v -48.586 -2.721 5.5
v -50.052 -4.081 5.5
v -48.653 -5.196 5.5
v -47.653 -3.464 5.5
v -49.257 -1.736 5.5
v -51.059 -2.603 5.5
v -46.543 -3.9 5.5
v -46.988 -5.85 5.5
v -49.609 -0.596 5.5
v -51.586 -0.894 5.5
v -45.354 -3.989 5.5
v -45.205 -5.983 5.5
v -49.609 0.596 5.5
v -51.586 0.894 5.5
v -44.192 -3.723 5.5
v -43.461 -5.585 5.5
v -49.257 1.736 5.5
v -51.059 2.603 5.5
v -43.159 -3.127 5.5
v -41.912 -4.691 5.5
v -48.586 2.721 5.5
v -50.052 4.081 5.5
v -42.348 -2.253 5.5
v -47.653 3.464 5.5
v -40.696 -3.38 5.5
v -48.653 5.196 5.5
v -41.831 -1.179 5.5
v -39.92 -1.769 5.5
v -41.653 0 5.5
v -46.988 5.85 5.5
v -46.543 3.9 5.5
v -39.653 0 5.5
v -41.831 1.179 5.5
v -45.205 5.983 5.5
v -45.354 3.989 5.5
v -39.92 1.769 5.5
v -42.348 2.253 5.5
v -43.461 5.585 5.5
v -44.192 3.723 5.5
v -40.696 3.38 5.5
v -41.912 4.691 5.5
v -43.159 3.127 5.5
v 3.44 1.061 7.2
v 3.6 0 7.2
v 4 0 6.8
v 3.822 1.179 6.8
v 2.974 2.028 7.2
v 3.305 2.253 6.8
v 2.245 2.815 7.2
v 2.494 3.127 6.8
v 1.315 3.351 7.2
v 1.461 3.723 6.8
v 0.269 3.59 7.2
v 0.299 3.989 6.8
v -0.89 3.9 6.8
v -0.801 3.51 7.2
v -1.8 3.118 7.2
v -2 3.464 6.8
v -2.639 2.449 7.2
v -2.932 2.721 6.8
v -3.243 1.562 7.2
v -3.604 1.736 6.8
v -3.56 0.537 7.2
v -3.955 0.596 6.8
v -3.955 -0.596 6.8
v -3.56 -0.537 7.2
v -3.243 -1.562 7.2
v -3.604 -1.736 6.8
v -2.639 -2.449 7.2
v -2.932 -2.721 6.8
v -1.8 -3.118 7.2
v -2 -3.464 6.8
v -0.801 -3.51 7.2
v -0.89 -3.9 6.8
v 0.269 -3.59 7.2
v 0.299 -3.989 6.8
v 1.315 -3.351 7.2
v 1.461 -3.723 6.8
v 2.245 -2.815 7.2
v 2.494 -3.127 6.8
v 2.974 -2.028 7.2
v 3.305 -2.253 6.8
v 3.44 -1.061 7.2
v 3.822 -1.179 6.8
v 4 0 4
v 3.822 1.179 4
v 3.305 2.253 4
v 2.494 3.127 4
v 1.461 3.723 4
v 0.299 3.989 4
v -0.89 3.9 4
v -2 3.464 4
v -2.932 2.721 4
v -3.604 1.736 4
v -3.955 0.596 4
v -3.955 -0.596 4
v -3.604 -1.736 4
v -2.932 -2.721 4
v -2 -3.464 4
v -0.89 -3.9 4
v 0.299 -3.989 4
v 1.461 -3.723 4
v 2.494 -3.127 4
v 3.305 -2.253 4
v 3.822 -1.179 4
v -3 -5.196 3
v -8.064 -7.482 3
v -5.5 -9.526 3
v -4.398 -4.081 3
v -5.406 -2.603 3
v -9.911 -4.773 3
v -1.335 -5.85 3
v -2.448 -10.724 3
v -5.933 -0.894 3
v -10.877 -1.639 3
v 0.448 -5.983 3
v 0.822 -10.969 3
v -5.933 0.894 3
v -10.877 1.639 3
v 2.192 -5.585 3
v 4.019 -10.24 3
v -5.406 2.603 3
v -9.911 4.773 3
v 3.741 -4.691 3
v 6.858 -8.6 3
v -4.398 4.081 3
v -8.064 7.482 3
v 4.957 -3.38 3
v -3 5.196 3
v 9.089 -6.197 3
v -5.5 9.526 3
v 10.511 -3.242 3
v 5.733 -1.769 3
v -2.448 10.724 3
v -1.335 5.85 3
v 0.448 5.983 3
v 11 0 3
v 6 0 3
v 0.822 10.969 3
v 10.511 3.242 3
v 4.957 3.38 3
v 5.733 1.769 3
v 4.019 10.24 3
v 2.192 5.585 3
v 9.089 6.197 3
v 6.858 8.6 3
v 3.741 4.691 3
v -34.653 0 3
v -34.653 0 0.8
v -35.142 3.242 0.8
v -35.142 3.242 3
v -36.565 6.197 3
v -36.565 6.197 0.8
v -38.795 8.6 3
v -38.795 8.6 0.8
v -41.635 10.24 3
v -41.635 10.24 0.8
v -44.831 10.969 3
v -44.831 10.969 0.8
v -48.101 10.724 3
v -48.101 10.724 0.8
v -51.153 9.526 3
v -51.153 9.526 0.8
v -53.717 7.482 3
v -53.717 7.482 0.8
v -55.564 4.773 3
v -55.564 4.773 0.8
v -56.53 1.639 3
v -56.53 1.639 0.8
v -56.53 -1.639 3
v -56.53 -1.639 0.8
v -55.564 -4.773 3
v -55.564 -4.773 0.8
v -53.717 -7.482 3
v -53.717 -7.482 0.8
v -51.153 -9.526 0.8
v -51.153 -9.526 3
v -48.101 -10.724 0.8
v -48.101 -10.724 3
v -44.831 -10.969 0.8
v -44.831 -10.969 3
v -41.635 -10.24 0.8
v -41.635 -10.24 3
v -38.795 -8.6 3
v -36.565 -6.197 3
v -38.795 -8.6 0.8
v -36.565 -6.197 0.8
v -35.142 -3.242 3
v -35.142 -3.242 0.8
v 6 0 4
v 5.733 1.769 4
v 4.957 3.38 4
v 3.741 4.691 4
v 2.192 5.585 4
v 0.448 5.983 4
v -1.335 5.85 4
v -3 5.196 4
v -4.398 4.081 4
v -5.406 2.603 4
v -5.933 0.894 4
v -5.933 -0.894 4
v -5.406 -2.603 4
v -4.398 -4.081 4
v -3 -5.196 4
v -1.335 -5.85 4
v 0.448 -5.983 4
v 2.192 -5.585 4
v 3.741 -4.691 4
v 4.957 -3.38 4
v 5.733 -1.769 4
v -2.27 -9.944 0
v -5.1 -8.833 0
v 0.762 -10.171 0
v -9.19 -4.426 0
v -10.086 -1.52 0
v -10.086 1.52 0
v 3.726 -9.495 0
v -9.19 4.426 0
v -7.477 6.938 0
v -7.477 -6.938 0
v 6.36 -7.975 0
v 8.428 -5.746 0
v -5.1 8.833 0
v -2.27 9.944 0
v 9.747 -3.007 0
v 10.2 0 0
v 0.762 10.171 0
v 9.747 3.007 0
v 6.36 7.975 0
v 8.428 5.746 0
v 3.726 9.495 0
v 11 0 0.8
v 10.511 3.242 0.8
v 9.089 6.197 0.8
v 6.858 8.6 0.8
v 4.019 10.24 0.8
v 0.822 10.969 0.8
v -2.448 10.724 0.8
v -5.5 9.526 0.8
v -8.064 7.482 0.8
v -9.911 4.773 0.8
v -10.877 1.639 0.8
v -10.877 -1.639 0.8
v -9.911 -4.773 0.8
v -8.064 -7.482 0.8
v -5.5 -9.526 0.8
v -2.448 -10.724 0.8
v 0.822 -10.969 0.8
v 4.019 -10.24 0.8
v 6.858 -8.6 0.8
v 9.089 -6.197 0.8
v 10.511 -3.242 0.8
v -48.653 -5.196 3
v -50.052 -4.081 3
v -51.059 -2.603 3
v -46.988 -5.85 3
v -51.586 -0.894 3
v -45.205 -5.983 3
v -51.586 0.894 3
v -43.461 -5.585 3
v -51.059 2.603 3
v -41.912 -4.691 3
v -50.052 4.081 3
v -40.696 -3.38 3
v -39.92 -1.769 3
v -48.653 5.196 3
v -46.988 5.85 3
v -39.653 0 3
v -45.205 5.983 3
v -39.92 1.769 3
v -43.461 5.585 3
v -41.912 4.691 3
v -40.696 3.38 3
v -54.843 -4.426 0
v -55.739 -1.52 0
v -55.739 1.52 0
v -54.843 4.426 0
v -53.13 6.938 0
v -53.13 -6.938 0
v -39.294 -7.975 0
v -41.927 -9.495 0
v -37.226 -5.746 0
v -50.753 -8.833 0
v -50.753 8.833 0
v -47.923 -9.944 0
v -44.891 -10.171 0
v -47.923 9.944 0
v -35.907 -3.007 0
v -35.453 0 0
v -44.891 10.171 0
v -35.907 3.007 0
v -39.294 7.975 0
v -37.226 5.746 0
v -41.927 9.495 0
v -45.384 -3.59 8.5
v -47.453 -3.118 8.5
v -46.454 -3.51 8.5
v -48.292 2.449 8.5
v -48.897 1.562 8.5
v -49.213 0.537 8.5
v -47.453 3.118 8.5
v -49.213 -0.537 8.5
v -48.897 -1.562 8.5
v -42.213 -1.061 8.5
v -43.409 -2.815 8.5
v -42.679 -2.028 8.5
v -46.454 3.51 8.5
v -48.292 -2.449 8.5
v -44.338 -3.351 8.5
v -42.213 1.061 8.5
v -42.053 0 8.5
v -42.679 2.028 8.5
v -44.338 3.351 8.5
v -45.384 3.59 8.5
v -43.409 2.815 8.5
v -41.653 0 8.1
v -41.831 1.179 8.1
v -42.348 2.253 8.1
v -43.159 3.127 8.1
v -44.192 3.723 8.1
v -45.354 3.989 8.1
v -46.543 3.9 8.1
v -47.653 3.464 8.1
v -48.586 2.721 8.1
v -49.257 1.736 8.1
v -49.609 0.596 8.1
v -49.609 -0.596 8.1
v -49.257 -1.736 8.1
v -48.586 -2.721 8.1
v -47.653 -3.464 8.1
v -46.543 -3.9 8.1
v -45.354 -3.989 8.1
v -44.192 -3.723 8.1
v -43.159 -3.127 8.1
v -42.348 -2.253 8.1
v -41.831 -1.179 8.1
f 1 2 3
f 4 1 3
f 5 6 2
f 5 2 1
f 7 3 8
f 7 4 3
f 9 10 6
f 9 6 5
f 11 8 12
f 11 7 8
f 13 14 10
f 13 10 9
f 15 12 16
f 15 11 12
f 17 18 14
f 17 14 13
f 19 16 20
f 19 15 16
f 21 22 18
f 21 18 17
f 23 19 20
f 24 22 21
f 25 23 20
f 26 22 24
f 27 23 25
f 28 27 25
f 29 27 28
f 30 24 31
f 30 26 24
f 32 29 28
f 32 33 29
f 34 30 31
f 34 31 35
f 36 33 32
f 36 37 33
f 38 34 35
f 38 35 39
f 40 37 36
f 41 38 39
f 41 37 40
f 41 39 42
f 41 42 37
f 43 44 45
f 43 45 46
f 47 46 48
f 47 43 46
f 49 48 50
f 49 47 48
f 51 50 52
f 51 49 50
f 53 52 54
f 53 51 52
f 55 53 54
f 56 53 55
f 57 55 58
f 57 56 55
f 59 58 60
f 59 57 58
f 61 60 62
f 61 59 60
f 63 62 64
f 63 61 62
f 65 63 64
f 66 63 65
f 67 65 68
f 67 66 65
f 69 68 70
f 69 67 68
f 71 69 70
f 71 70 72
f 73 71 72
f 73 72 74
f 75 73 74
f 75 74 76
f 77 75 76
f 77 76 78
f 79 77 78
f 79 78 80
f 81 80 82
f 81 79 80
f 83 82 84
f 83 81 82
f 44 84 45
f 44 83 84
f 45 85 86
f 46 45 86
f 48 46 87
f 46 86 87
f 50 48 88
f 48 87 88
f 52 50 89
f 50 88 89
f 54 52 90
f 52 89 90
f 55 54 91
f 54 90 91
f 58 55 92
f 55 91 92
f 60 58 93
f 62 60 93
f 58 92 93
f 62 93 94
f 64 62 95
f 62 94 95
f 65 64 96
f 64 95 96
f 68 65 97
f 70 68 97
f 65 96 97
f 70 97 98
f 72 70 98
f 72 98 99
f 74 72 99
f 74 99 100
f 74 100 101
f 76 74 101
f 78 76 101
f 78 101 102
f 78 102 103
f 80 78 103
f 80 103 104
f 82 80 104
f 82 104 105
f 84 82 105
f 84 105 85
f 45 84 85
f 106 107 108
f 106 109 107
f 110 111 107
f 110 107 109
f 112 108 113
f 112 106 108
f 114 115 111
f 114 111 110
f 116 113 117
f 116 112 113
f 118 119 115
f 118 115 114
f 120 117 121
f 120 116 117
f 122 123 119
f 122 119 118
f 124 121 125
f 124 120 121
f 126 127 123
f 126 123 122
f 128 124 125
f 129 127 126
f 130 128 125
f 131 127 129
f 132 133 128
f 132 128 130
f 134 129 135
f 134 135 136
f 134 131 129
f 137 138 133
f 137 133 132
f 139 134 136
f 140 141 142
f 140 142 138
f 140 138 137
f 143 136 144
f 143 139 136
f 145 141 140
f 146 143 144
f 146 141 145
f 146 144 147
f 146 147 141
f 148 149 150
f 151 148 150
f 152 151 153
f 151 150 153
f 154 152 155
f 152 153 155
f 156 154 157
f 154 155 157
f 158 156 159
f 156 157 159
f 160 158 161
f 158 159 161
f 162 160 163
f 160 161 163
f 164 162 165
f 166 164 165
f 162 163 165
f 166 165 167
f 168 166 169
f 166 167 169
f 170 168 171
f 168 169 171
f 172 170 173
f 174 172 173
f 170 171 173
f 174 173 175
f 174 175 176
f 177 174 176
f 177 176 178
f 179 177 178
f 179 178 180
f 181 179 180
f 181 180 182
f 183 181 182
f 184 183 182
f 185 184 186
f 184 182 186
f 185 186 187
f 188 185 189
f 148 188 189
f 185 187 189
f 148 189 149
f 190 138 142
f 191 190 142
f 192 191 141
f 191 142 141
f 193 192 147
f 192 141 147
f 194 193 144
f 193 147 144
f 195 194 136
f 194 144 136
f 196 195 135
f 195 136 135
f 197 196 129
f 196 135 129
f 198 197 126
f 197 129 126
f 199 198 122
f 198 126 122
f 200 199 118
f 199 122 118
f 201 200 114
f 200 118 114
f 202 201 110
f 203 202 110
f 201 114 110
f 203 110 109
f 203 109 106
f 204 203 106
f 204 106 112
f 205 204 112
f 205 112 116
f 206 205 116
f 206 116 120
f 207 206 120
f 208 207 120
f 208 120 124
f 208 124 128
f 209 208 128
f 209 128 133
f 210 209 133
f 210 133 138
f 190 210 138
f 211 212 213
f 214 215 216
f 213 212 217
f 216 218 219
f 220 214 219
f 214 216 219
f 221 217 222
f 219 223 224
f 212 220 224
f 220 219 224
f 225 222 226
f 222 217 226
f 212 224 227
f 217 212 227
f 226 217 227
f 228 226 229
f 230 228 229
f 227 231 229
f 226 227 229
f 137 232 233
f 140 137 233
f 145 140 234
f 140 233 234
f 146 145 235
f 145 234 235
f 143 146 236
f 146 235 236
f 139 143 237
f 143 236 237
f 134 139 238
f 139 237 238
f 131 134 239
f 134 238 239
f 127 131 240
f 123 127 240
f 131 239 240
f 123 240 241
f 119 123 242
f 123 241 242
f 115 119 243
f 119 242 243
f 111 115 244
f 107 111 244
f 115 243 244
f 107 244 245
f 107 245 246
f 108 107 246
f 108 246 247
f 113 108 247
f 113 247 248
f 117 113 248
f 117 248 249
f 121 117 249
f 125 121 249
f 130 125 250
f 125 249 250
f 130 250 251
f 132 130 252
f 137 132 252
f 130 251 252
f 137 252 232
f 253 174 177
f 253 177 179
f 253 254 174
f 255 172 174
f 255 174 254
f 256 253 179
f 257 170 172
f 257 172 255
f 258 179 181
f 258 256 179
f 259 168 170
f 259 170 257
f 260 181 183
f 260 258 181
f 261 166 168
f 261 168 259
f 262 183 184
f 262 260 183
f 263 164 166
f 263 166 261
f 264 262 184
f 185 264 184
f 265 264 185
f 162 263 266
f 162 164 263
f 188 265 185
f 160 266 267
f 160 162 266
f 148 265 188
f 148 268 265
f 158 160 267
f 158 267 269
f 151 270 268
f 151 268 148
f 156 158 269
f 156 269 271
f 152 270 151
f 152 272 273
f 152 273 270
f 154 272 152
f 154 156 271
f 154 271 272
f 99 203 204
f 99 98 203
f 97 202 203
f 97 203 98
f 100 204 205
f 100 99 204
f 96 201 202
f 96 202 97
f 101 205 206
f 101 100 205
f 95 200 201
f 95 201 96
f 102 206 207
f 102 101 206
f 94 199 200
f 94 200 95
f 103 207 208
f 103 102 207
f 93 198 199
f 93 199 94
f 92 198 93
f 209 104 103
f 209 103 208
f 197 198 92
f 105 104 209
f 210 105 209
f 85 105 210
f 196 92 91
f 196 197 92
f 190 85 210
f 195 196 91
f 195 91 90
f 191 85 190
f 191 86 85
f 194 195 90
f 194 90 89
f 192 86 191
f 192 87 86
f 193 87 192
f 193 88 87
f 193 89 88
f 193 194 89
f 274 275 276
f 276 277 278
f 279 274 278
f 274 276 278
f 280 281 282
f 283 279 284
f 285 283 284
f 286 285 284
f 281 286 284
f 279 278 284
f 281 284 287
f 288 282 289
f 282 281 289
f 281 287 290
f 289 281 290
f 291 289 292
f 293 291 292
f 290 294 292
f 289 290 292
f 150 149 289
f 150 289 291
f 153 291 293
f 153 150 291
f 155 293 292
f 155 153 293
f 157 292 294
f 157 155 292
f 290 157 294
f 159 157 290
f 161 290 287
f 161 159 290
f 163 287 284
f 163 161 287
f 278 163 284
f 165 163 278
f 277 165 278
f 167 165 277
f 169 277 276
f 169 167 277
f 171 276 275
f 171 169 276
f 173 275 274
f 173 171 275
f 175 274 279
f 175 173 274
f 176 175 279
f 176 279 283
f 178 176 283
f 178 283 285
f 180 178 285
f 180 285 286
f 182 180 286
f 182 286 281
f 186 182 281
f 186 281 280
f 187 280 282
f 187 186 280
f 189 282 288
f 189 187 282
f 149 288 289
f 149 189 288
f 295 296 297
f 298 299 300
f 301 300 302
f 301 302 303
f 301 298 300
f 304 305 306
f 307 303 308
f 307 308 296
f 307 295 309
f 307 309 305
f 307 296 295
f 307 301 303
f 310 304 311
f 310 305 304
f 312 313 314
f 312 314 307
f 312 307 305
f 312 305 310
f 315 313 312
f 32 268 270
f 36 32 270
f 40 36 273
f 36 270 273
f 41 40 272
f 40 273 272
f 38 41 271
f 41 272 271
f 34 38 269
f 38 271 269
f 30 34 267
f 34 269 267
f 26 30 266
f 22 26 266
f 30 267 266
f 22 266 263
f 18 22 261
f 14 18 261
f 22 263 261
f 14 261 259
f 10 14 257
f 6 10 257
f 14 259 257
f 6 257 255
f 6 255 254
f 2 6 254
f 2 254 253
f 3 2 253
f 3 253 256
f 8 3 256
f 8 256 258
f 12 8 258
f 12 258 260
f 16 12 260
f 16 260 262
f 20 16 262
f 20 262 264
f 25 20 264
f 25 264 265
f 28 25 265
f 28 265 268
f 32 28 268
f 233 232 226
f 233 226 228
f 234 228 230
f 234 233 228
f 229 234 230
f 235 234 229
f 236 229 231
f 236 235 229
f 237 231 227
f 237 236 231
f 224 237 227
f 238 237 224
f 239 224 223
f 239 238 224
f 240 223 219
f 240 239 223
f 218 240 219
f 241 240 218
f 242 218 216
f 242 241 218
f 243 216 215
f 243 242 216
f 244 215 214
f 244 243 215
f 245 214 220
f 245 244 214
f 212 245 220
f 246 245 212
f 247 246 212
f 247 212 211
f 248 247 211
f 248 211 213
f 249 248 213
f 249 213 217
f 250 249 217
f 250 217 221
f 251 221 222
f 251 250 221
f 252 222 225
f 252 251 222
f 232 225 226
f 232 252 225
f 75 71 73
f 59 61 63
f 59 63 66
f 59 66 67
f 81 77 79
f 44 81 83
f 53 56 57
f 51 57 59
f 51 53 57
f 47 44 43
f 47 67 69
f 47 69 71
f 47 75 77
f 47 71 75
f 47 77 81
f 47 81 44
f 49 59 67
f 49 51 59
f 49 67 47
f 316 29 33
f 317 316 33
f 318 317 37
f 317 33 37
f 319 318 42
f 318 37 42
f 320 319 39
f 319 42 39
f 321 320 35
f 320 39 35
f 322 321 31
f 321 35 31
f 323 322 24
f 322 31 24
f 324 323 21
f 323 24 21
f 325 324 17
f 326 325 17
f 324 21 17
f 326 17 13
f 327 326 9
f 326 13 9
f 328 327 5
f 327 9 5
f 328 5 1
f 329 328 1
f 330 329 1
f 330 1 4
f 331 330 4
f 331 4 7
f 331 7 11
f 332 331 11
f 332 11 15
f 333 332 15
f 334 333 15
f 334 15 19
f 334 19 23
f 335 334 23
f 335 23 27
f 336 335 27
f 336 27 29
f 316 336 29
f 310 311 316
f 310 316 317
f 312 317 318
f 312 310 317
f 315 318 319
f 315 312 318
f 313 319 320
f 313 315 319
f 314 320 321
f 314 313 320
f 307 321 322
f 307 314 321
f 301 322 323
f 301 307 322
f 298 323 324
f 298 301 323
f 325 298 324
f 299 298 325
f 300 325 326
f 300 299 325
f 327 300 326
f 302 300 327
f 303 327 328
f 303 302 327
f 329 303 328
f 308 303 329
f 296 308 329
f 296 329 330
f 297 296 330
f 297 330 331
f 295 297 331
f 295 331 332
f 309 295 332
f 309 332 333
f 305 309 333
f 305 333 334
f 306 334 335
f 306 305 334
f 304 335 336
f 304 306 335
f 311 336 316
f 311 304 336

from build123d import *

# Parameters (mm, degrees)
F0_R      = 11
F0_R_2    = 6
F0_R_3    = 4
F1_DEPTH  = 3
F2_DEPTH  = 5.5
F3_DEPTH  = 8.5
F4_DEPTH  = 3
F5_DEPTH  = 4
F6_DEPTH  = 7.2
F7_SIZE   = 0.8
F7_2_SIZE = 0.8
F8_SIZE   = 0.4
F8_2_SIZE = 0.4


with BuildPart() as f1:
    # F0 (on Top) → F1 (new body)
    with BuildSketch(Plane.XY):
        with Locations((-45.653354, 0)):
            Circle(F0_R)
        with Locations((-45.653354, 0)):
            Circle(F0_R_2, mode=Mode.SUBTRACT)
        with Locations((-45.653354, 0)):
            Circle(F0_R_3)
        with Locations((-45.653354, 0)):
            Circle(F0_R_2)
        with Locations((-45.653354, 0)):
            Circle(F0_R_3, mode=Mode.SUBTRACT)
    extrude(amount=F1_DEPTH)

    # F0 (on Top) → F2 (join)
    with BuildSketch(Plane.XY):
        with Locations((-45.653354, 0)):
            Circle(F0_R_2)
        with Locations((-45.653354, 0)):
            Circle(F0_R_3, mode=Mode.SUBTRACT)
        with Locations((-45.653354, 0)):
            Circle(F0_R_3)
    extrude(amount=F2_DEPTH)

    # F0 (on Top) → F3 (join)
    with BuildSketch(Plane.XY):
        with Locations((-45.653354, 0)):
            Circle(F0_R_3)
    extrude(amount=F3_DEPTH)

    # F7
    f7_edges = [f1.edges().sort_by_distance(p)[0] for p in [
        (-56.653354, 0, 0),
    ]]
    chamfer(f7_edges, length=F7_SIZE)

    # F8
    f8_edges = [f1.edges().sort_by_distance(p)[0] for p in [
        (-49.653354, 0, 8.5),
    ]]
    chamfer(f8_edges, length=F8_SIZE)


with BuildPart() as f4:
    # F0 (on Top) → F4 (new body)
    with BuildSketch(Plane.XY):
        Circle(F0_R)
        Circle(F0_R_2, mode=Mode.SUBTRACT)
        Circle(F0_R_2)
        Circle(F0_R_3, mode=Mode.SUBTRACT)
        Circle(F0_R_3)
    extrude(amount=F4_DEPTH)

    # F0 (on Top) → F5 (join)
    with BuildSketch(Plane.XY):
        Circle(F0_R_3)
        Circle(F0_R_2)
        Circle(F0_R_3, mode=Mode.SUBTRACT)
    extrude(amount=F5_DEPTH)

    # F0 (on Top) → F6 (join)
    with BuildSketch(Plane.XY):
        Circle(F0_R_3)
    extrude(amount=F6_DEPTH)

    # F7#2
    f7_2_edges = [f4.edges().sort_by_distance(p)[0] for p in [
        (-11, 0, 0),
    ]]
    chamfer(f7_2_edges, length=F7_2_SIZE)

    # F8#2
    f8_2_edges = [f4.edges().sort_by_distance(p)[0] for p in [
        (-4, 0, 7.2),
    ]]
    chamfer(f8_2_edges, length=F8_2_SIZE)


solid = Compound([f1.part, f4.part])
